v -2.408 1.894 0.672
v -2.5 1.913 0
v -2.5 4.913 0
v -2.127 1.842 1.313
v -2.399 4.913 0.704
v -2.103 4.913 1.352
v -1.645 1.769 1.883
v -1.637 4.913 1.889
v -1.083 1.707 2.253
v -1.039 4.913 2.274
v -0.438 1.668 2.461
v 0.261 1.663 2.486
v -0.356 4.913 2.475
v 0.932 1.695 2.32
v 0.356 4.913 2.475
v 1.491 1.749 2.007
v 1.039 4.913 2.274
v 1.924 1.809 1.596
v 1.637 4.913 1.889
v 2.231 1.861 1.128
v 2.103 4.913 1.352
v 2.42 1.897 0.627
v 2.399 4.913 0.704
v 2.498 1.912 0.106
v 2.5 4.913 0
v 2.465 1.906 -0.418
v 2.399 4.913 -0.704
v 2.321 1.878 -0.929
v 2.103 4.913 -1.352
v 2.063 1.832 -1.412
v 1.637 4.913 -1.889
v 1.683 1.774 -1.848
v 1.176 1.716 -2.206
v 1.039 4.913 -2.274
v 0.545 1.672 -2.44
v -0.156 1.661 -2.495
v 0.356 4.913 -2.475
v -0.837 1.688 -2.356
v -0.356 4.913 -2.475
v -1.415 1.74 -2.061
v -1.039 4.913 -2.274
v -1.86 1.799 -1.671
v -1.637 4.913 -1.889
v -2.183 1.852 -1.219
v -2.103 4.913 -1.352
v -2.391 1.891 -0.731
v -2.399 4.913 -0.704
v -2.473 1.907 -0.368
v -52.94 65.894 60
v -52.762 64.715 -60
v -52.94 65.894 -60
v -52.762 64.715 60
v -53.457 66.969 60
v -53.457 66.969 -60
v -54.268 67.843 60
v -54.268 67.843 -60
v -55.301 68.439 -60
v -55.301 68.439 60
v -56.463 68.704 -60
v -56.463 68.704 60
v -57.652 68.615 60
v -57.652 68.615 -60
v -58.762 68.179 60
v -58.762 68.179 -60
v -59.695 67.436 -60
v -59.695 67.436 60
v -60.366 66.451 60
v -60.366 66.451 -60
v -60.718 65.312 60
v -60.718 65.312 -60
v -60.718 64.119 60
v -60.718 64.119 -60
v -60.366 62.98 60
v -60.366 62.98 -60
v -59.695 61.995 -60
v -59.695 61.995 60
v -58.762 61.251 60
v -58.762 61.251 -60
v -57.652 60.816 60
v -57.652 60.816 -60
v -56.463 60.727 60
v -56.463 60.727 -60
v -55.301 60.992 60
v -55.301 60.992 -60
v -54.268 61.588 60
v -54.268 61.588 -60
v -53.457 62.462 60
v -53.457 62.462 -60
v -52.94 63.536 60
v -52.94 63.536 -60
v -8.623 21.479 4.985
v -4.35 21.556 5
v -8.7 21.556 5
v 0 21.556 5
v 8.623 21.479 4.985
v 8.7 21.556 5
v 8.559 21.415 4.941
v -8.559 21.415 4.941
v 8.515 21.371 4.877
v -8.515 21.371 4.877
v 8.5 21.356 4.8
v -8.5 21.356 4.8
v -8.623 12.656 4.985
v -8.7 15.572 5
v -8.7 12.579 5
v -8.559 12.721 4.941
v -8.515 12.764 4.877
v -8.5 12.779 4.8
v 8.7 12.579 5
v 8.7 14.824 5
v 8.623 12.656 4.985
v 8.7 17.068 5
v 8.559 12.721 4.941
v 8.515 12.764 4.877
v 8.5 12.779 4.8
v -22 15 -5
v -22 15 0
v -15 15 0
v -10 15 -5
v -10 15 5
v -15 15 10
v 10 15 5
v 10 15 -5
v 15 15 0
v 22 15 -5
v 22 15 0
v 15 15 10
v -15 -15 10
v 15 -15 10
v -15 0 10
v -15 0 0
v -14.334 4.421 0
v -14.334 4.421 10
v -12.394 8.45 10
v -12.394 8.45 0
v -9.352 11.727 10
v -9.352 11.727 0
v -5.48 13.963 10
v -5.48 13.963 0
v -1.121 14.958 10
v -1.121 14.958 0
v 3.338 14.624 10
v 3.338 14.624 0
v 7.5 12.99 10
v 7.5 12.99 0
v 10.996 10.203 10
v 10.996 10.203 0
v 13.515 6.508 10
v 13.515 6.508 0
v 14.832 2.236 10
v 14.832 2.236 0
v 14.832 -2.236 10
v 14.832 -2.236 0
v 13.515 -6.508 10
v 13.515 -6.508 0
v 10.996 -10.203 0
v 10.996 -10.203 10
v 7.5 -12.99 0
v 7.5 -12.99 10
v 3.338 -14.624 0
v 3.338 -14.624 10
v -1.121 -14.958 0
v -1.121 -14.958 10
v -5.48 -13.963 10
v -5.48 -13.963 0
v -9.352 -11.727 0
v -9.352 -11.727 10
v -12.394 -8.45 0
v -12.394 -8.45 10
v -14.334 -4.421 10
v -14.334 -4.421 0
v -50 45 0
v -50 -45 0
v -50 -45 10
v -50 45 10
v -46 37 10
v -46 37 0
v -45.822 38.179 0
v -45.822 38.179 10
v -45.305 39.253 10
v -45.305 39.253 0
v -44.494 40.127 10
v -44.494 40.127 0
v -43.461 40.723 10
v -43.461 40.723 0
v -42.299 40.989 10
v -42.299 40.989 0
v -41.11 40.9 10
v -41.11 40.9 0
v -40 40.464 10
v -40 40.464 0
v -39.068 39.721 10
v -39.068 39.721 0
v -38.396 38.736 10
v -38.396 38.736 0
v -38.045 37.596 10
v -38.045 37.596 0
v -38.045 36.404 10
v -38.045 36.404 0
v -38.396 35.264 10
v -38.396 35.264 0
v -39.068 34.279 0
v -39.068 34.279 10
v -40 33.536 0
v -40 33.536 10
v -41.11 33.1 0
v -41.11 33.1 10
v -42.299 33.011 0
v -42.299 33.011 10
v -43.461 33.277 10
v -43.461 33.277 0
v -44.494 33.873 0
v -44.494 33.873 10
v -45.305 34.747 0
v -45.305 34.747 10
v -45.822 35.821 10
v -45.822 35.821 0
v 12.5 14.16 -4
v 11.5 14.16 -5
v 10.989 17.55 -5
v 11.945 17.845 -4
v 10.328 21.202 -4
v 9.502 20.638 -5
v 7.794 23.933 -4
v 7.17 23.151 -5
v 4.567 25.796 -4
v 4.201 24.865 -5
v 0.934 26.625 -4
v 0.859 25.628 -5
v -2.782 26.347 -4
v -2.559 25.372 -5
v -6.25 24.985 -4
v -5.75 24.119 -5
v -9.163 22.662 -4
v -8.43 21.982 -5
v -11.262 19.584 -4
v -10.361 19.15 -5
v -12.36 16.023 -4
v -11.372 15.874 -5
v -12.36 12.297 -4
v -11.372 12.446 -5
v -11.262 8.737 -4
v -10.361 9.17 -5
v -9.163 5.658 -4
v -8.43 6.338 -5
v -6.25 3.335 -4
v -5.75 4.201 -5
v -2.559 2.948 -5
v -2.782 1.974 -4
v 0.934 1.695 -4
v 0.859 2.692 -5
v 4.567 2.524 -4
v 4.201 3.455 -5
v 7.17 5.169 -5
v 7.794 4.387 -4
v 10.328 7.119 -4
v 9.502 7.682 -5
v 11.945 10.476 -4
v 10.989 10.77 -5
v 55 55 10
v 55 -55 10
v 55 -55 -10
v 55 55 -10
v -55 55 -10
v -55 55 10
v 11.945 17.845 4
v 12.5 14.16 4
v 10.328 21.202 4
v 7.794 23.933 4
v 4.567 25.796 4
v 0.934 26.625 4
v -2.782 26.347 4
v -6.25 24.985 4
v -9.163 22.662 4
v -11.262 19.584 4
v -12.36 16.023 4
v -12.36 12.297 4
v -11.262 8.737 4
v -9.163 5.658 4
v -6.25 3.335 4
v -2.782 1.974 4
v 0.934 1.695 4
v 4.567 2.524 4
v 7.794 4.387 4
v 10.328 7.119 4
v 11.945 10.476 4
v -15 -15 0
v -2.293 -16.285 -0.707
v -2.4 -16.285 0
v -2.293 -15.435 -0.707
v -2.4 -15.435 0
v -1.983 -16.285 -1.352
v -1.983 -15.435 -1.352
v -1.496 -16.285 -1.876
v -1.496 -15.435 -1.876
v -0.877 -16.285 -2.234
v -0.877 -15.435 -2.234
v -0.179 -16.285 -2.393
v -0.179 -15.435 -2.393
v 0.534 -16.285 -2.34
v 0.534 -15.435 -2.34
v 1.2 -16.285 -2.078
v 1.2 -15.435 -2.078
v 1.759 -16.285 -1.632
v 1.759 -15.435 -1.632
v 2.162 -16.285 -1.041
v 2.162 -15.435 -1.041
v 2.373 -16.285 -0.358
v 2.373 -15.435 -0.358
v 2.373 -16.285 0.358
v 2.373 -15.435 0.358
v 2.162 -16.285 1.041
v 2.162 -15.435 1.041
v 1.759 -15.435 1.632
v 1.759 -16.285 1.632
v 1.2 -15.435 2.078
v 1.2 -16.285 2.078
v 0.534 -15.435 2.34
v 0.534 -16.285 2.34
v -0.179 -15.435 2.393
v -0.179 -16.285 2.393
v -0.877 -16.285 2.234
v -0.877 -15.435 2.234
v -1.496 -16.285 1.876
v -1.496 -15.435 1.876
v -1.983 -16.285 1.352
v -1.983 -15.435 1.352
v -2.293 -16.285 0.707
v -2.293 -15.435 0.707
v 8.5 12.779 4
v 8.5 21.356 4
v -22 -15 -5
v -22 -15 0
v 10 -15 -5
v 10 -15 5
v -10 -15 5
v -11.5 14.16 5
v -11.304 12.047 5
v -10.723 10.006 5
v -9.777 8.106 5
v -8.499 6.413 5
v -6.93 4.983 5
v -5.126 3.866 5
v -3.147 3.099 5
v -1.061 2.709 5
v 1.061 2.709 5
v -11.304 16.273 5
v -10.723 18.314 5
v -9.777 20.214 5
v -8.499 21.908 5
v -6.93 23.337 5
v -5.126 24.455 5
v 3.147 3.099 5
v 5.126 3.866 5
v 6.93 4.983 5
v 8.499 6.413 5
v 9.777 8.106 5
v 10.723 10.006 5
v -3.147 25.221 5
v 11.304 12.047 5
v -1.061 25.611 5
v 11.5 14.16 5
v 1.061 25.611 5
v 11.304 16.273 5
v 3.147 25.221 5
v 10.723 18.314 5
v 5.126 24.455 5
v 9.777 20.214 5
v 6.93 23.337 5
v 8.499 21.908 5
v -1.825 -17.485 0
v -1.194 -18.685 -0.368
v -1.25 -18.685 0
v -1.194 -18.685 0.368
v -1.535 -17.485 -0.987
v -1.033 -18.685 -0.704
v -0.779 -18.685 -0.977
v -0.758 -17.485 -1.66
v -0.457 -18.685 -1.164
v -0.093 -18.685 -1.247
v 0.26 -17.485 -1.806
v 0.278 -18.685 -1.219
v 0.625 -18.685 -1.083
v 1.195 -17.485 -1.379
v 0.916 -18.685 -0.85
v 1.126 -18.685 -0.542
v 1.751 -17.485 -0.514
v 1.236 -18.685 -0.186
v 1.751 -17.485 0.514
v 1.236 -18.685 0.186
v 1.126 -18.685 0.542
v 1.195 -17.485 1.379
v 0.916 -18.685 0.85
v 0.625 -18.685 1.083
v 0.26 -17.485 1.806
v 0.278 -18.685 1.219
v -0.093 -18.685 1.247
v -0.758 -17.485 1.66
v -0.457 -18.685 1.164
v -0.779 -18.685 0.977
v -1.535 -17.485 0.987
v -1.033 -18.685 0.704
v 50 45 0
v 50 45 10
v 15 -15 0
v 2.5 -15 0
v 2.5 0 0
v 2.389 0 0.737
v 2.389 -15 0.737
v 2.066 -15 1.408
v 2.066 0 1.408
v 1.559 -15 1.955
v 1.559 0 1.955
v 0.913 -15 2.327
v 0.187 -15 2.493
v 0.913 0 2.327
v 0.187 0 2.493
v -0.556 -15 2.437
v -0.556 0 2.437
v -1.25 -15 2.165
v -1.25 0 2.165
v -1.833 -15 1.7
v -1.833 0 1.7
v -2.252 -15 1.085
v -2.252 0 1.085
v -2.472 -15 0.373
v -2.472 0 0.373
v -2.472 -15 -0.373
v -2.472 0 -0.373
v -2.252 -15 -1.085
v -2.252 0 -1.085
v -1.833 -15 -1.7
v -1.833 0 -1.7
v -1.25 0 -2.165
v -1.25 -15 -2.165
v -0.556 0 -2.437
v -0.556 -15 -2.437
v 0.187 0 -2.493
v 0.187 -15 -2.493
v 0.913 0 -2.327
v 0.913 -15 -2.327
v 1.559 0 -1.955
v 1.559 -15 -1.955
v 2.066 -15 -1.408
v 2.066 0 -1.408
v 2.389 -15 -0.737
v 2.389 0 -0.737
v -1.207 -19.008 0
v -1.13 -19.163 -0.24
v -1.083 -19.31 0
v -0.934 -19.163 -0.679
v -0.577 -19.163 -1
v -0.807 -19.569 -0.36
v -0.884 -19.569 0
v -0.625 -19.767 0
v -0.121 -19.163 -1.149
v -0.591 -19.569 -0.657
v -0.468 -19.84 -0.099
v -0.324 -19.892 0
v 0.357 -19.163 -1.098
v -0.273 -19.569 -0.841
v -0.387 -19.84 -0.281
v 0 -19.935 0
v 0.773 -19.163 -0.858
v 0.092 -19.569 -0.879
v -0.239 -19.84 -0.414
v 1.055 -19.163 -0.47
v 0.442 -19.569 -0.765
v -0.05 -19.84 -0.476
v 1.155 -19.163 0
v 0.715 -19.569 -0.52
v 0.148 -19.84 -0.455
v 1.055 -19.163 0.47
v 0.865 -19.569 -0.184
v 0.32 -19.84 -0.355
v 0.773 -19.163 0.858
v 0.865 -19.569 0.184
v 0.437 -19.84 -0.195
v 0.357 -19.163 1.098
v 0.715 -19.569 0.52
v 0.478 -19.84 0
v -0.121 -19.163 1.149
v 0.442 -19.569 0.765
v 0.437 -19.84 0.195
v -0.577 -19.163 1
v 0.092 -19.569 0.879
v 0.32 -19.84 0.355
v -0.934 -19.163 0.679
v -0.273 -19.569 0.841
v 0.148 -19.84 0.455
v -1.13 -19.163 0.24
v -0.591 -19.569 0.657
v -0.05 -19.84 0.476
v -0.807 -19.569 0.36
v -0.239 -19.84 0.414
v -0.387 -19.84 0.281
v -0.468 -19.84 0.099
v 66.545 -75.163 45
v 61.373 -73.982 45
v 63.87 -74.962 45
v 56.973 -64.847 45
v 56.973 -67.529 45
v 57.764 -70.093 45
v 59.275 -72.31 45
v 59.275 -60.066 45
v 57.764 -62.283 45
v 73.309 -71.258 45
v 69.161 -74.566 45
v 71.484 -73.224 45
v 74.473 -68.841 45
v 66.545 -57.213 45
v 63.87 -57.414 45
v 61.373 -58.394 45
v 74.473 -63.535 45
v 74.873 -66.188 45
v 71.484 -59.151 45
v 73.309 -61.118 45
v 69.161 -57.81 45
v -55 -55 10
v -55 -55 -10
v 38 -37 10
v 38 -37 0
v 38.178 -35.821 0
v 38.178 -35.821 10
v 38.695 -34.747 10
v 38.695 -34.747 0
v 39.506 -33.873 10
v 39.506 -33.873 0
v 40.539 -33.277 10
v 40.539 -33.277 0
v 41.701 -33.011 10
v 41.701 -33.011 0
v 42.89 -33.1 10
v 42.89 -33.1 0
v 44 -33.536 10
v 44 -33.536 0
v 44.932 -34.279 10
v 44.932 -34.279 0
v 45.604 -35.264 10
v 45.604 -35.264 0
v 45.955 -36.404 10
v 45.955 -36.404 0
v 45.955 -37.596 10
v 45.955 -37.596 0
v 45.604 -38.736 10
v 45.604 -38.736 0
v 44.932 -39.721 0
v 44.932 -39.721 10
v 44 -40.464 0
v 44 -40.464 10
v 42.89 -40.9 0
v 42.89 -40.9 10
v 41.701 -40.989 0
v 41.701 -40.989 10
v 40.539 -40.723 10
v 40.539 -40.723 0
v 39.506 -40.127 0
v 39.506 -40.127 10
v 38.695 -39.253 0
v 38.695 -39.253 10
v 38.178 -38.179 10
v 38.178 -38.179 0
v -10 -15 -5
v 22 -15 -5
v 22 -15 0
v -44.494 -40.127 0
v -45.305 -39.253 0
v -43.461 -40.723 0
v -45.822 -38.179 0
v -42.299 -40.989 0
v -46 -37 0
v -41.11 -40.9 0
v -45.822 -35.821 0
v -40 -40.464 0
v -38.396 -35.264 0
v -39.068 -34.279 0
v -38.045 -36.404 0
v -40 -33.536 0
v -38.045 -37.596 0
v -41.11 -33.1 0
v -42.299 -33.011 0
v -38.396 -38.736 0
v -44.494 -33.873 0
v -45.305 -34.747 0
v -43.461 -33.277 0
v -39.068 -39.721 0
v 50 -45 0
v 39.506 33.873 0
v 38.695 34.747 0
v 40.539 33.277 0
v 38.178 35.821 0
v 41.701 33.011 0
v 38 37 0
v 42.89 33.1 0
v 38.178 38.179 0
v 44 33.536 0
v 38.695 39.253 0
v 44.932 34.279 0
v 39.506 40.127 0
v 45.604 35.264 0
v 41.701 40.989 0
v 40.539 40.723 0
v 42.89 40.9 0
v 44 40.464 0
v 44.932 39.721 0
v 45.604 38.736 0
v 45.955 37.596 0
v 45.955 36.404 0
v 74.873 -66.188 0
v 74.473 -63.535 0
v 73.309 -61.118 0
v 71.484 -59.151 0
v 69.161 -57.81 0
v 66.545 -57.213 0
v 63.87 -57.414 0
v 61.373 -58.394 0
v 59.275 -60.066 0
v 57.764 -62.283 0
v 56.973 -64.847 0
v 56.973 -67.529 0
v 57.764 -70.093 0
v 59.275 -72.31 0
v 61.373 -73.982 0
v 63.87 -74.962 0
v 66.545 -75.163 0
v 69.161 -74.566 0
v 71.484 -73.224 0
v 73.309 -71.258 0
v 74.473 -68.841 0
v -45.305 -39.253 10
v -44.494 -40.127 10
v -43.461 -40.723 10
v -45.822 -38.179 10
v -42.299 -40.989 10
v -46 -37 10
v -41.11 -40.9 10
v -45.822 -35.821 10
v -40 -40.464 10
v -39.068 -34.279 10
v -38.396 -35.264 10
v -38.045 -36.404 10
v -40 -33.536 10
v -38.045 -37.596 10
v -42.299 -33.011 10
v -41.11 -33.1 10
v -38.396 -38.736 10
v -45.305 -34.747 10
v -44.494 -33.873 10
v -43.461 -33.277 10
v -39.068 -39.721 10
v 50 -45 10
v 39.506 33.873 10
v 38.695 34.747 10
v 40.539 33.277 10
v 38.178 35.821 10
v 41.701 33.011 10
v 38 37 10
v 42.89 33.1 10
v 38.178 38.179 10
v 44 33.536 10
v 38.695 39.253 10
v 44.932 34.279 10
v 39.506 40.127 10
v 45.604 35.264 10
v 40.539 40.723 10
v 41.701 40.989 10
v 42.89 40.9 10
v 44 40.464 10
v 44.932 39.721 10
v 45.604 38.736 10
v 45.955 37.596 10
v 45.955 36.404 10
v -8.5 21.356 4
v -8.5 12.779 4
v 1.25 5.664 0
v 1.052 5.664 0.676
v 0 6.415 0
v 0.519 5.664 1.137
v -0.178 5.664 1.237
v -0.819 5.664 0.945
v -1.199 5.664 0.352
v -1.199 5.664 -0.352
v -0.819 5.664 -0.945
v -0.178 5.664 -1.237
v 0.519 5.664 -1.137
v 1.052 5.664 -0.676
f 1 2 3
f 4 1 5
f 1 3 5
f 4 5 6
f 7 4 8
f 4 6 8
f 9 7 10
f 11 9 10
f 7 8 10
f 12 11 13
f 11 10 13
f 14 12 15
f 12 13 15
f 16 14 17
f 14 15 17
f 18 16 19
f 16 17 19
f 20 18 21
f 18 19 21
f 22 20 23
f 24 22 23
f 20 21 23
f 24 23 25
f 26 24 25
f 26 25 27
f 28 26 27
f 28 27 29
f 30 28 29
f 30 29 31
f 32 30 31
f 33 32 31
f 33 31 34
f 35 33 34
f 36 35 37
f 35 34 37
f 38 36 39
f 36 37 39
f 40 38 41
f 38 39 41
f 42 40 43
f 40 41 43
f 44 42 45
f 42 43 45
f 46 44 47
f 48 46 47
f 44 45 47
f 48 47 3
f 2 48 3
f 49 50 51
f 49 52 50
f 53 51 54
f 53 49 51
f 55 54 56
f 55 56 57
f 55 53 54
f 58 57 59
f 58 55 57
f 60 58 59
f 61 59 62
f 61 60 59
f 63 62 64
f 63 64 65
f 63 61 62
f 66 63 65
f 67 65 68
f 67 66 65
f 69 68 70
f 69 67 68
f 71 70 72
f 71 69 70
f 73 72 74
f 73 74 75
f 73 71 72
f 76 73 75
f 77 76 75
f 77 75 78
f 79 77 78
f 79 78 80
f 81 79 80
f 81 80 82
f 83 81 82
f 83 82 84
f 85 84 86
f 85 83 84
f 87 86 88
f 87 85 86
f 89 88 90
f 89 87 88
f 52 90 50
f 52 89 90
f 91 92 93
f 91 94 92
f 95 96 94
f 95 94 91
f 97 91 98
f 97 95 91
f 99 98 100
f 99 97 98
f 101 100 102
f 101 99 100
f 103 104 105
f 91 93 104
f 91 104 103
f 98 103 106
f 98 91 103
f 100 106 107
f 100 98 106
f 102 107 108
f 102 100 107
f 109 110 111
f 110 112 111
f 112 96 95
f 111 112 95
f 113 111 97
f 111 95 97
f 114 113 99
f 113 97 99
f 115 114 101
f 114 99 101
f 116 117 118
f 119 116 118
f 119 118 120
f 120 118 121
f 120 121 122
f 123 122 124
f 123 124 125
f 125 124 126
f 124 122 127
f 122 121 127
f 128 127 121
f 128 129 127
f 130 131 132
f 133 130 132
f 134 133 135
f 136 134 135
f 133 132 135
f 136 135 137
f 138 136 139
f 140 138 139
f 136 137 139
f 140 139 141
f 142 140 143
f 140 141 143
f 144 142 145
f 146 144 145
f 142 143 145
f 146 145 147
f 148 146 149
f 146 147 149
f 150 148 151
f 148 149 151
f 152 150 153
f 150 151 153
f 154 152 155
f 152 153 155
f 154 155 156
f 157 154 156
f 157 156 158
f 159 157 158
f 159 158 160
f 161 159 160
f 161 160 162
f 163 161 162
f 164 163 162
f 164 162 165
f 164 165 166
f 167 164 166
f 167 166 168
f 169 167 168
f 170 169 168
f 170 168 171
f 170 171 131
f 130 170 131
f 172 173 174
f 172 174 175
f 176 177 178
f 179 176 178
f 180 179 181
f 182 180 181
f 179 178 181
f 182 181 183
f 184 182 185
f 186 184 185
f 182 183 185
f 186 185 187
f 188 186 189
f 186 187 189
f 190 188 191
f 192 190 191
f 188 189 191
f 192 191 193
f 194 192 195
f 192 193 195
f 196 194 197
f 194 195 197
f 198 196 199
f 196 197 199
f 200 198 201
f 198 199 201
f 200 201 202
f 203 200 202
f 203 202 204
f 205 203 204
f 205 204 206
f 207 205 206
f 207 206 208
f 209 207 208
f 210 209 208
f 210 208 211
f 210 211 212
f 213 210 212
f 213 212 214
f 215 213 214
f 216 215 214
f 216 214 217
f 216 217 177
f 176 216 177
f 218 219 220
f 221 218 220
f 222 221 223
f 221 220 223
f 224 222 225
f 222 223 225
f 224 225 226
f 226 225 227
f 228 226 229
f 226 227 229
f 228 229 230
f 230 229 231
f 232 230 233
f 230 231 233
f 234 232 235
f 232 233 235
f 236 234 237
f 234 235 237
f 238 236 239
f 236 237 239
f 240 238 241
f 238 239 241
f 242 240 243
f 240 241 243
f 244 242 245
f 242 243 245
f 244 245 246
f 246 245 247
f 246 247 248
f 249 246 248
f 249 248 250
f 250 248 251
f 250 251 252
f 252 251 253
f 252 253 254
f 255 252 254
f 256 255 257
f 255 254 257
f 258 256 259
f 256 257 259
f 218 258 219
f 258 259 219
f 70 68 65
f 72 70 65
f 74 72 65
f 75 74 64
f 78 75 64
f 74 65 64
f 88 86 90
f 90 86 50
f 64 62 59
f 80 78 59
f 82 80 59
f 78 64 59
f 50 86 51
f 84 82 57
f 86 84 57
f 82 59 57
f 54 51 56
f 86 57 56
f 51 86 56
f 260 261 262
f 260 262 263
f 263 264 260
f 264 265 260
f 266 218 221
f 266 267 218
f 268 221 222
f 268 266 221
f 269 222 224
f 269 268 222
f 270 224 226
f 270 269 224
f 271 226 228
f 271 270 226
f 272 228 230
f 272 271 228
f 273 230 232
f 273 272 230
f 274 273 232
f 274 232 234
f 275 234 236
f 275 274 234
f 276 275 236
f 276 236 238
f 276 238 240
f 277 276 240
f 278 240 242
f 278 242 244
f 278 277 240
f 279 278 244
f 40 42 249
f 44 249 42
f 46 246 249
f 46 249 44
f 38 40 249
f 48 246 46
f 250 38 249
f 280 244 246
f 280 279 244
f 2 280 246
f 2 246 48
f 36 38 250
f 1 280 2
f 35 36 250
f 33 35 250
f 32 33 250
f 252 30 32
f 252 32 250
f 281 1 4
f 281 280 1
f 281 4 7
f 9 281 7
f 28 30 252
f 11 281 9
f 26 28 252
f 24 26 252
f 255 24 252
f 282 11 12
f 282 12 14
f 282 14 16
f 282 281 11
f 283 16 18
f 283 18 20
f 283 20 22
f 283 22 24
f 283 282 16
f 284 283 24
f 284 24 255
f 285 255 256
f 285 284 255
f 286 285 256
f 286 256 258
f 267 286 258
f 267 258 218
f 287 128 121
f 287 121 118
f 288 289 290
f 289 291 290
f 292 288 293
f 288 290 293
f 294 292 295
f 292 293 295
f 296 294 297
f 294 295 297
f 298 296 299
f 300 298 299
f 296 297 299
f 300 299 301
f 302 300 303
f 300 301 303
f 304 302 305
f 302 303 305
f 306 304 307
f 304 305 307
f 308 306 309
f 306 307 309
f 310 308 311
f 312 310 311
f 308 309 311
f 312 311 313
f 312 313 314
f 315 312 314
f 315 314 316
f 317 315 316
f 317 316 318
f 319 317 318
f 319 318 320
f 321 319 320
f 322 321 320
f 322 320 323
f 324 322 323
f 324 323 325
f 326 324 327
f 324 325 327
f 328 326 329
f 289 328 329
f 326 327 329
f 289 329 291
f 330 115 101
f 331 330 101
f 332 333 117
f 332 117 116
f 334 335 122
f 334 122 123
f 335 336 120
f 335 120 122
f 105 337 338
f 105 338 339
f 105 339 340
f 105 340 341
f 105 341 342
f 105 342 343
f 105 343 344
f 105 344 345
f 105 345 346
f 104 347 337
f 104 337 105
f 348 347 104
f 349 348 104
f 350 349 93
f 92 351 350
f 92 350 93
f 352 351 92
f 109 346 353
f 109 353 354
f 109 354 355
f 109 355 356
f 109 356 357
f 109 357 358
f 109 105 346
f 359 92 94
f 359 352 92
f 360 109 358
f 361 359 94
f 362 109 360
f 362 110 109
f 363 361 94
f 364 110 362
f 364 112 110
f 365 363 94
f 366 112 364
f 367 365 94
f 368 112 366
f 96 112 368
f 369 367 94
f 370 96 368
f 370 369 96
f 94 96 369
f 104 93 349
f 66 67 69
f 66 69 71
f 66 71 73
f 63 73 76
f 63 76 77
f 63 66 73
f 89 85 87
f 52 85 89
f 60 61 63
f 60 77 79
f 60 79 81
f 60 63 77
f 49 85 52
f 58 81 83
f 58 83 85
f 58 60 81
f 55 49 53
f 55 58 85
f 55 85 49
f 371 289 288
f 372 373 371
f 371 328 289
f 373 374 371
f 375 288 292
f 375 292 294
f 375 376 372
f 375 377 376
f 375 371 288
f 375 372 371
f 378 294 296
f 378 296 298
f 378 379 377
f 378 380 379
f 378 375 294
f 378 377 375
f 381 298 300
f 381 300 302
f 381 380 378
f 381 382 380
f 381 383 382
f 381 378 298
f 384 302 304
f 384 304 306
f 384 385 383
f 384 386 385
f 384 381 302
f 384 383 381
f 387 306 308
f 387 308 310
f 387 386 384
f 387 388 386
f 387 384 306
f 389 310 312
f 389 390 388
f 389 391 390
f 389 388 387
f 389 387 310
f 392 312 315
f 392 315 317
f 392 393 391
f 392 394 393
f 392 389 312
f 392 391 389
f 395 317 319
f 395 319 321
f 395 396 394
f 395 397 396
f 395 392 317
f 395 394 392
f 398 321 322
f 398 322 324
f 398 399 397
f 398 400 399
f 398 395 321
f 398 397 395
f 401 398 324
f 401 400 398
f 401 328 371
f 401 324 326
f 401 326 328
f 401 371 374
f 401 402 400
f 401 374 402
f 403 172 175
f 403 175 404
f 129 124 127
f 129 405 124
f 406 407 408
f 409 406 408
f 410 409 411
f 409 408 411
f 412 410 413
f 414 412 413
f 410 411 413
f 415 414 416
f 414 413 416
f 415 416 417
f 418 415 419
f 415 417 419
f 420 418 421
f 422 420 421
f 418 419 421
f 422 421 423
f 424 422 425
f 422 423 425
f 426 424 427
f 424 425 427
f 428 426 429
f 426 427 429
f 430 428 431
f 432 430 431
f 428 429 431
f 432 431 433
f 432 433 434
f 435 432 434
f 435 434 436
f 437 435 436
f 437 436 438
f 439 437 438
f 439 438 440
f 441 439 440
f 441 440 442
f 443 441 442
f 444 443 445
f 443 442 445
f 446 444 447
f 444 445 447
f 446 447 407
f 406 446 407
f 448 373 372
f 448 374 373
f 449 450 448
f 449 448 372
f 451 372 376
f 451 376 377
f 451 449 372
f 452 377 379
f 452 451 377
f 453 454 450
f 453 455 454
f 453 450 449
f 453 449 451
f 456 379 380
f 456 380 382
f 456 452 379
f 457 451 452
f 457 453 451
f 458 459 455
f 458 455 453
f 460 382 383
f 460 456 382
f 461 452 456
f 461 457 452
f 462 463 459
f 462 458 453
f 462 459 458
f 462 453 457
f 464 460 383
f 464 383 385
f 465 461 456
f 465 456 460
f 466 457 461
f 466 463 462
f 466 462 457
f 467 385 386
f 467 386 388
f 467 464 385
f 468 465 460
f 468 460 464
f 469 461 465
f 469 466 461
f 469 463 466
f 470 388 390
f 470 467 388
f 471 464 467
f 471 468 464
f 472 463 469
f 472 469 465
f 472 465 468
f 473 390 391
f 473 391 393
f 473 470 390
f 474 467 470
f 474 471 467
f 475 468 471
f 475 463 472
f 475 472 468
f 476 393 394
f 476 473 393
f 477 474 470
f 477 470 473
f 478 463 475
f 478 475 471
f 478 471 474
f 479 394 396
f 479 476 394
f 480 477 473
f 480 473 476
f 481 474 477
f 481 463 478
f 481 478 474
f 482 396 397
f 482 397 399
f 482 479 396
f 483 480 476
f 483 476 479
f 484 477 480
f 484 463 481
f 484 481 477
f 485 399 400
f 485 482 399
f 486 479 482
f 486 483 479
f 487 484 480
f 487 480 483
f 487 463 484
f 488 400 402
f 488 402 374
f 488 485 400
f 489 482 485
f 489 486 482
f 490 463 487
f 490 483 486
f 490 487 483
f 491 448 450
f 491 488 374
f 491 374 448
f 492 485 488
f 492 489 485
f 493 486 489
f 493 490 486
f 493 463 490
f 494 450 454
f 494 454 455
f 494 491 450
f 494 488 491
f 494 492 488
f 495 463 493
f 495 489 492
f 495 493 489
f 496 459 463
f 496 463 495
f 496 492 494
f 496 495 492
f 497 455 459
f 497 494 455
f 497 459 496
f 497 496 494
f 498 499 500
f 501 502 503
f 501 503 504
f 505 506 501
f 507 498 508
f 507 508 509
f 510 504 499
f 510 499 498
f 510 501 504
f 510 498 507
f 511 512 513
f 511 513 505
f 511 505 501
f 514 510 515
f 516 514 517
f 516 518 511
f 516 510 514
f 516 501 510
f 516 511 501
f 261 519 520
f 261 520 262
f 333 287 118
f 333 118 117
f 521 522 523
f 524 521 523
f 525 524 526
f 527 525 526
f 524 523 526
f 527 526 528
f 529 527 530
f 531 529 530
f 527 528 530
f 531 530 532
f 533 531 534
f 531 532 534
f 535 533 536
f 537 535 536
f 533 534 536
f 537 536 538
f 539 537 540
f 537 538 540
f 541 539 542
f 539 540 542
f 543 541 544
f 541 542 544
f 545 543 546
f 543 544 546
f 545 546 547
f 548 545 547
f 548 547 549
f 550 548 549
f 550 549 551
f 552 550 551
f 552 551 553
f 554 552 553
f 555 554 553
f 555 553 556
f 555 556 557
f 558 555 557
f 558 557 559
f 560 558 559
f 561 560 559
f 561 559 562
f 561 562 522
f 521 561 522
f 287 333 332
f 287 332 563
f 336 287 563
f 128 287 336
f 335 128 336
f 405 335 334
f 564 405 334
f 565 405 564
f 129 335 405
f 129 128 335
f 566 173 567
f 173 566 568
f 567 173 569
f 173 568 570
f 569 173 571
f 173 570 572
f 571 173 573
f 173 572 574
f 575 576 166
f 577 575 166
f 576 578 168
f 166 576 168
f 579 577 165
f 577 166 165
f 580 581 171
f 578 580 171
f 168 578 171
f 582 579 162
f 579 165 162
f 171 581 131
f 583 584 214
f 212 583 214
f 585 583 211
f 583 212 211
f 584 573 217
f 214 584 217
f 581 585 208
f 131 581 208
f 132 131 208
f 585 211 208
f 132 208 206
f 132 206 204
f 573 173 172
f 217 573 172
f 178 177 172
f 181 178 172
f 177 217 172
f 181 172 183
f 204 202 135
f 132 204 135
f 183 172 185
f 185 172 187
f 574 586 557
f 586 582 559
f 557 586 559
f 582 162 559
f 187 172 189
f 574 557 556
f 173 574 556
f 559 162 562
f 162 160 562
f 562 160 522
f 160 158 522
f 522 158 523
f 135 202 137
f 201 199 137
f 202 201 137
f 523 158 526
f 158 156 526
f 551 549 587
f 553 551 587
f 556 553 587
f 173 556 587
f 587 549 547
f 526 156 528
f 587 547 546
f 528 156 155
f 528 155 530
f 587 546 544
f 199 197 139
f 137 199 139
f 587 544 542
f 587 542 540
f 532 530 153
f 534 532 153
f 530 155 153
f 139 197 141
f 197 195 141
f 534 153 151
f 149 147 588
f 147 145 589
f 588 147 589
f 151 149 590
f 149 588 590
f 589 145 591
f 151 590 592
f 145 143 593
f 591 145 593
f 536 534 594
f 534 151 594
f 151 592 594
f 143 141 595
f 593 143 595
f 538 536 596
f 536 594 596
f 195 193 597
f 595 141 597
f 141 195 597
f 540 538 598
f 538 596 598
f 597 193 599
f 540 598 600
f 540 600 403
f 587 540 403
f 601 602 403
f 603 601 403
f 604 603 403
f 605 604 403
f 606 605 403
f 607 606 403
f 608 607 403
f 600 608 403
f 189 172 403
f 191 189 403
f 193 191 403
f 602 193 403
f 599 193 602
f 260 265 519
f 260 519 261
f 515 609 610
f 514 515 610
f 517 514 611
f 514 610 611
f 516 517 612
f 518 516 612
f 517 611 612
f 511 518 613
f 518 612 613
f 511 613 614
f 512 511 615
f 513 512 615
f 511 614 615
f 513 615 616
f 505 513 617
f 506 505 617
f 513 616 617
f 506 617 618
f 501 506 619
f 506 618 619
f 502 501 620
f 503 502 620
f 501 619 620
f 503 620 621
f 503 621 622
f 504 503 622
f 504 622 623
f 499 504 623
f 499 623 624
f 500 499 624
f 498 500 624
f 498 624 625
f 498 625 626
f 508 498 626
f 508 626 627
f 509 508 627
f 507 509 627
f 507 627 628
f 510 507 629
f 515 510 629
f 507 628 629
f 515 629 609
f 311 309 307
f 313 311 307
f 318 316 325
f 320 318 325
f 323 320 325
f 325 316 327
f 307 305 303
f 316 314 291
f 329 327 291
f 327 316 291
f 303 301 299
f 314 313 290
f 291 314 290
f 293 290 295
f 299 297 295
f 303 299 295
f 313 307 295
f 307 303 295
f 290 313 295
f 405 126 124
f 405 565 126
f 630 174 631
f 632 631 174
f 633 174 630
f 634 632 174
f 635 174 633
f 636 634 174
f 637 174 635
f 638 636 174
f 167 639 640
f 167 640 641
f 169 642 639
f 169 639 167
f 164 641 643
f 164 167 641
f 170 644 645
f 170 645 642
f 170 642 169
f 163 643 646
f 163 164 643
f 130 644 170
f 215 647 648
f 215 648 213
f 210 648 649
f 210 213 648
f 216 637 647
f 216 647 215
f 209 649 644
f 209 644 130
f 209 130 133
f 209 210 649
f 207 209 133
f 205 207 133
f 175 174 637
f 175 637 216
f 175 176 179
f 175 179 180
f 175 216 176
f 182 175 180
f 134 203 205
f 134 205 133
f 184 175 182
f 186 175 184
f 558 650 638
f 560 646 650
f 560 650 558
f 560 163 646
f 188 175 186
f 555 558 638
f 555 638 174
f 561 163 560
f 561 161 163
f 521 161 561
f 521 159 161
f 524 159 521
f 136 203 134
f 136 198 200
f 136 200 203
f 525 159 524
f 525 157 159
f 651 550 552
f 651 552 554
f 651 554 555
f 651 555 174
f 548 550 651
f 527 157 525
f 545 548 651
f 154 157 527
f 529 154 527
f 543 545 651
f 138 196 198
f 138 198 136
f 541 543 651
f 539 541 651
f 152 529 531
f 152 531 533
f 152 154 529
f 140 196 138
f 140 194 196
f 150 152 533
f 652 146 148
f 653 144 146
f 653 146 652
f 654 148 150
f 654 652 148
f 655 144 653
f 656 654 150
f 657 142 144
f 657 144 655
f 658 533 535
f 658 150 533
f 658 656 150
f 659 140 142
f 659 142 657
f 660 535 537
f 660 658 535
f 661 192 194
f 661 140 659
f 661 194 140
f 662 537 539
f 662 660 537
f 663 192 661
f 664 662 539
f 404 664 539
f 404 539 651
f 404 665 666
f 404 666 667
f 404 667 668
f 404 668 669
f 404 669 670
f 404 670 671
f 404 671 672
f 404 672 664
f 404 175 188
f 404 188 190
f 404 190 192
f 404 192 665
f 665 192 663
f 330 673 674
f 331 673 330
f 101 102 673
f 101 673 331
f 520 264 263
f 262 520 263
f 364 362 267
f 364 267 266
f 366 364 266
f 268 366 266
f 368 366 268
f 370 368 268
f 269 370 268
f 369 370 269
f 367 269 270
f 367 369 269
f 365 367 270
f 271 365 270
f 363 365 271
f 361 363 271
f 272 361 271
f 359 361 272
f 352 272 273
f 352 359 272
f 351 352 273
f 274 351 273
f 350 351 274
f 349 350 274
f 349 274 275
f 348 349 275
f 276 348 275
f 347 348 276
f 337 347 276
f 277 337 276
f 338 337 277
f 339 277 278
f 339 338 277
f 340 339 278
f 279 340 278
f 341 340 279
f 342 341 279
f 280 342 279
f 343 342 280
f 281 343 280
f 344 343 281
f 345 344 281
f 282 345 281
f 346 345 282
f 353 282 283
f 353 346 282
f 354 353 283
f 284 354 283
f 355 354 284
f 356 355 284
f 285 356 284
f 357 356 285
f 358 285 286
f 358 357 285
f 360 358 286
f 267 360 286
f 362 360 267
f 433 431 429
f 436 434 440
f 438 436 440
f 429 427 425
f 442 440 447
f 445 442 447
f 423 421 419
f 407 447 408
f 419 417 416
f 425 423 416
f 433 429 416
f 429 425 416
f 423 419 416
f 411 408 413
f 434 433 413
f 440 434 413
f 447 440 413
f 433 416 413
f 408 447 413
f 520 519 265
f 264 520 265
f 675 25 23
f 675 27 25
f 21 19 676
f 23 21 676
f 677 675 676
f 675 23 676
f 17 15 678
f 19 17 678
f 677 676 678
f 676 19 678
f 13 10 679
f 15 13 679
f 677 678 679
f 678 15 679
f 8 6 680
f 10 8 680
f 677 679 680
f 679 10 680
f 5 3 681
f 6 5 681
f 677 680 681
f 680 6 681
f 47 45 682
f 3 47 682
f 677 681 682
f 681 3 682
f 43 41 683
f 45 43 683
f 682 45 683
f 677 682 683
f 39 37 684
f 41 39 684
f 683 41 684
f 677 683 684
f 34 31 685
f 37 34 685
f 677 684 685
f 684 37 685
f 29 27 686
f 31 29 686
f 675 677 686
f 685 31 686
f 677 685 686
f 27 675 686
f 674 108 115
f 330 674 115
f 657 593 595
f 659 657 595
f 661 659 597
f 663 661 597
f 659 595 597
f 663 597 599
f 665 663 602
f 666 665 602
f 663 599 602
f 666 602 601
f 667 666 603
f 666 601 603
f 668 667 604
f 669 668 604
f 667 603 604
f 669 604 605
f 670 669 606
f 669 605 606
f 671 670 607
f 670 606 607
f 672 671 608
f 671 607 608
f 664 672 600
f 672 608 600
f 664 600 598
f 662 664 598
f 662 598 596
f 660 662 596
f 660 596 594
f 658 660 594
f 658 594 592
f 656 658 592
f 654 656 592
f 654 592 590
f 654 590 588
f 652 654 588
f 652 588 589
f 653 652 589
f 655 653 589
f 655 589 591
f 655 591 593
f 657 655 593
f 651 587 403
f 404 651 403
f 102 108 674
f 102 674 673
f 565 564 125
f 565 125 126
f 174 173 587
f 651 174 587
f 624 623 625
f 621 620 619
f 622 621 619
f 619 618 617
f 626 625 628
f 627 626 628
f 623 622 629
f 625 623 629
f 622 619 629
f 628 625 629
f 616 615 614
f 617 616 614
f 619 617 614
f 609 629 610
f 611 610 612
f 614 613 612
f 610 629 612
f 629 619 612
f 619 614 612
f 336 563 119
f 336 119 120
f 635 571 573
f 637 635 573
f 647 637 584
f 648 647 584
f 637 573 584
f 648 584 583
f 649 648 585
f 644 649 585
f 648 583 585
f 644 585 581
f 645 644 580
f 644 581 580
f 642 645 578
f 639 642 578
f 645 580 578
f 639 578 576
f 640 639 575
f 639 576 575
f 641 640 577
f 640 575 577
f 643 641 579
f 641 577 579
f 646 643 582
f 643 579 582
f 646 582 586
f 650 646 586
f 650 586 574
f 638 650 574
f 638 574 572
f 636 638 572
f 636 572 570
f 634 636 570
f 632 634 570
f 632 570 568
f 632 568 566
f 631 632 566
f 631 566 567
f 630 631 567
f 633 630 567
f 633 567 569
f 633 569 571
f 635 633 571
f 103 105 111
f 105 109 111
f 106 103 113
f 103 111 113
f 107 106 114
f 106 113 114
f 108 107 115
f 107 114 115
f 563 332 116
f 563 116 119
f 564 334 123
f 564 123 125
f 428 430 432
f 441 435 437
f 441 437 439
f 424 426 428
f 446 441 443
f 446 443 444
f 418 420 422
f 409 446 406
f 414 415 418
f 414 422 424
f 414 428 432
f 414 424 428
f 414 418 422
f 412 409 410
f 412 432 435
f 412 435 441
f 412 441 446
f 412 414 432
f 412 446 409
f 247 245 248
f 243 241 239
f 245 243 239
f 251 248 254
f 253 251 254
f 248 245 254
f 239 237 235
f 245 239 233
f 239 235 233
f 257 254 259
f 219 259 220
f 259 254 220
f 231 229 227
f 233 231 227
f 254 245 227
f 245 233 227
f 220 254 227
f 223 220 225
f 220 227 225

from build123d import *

# Parameters (mm, degrees)
F0_W           = 100
F0_H           = 90
F1_DEPTH       = 10
F3_D           = 8
F4_R           = 9
F5_DEPTH       = 45
F6_R           = 4
F7_DEPTH       = 60
F7_DEPTH_BACK  = 60
F8_W           = 110
F8_H           = 110
F9_DEPTH       = 10
F9_DEPTH_BACK  = 10
F11_D          = 30
F12_R          = 12.5
F13_DEPTH      = 5
F13_DEPTH_BACK = 5
F14_R          = 2.5
F15_DEPTH      = 15
F16_W          = 2.4
F16_H          = 0.85
F18_W          = 17
F18_H          = 8.5765231597
F19_DEPTH      = 1
F20_SIZE       = 1
F21_R          = 0.2
F23_D          = 5
F23_DEPTH      = 3
F23_START      = 1.9126872
F23_TIP        = 1.5021515476
F25_DEPTH      = 15
F25_DEPTH_BACK = 15


with BuildPart() as f1:
    # F0 (on Top) → F1 (new body)
    with BuildSketch(Plane.XY):
        Rectangle(F0_W, F0_H)
    extrude(amount=F1_DEPTH)

    # F3 (through all)
    with Locations(Plane.XY.offset(10)):
        with Locations((-42, 37), (42, 37), (42, -37), (-42, -37)):
            Hole(F3_D / 2)

    # F11 (through all)
    with Locations(Plane.XY.offset(10)):
        with Locations((0, 0)):
            Hole(F11_D / 2)


with BuildPart() as f5:
    # F4 (on Top) → F5 (new body)
    with BuildSketch(Plane.XY):
        with Locations((65.8727884293, -66.1879479885)):
            Circle(F4_R)
    extrude(amount=F5_DEPTH)


with BuildPart() as f7:
    # F6 (on Top) → F7 (new body, two sides)
    with BuildSketch(Plane.XY) as f7_sk:
        with Locations((-56.7623786628, 64.7153481841)):
            Circle(F6_R)
    extrude(amount=F7_DEPTH)
    extrude(f7_sk.sketch, amount=-F7_DEPTH_BACK)


with BuildPart() as f9:
    # F8 (on Top) → F9 (new body, two sides)
    with BuildSketch(Plane.XY) as f9_sk:
        Rectangle(F8_W, F8_H)
    extrude(amount=F9_DEPTH)
    extrude(f9_sk.sketch, amount=-F9_DEPTH_BACK)


with BuildPart() as f13:
    # F12 (on Top) → F13 (new body, two sides)
    with BuildSketch(Plane.XY) as f13_sk:
        with Locations((0, 14.160135775)):
            Circle(F12_R)
    extrude(amount=F13_DEPTH)
    extrude(f13_sk.sketch, amount=-F13_DEPTH_BACK)

    # F18 (on face) → F19 (cut)
    with BuildSketch(Plane.XY.offset(5)):
        with Locations((0, 17.0677408393)):
            Rectangle(F18_W, F18_H)
    extrude(amount=-F19_DEPTH, mode=Mode.SUBTRACT)

    # F20
    f20_edges = [f13.edges().sort_by_distance(p)[0] for p in [
        (-12.5, 14.160136, -5),
        (-12.5, 14.160136, 5),
    ]]
    chamfer(f20_edges, length=F20_SIZE)

    # F21
    f21_edges = [f13.edges().sort_by_distance(p)[0] for p in [
        (0, 21.356002, 5),
        (8.5, 17.067741, 5),
        (0, 12.779479, 5),
        (-8.5, 17.067741, 5),
    ]]
    fillet(f21_edges, radius=F21_R)

    # F23
    # its depths count from where the whole tool has entered the part; down to there all is cleared
    with Locations(Plane.XZ.offset(-F23_START)):
        with Locations((0, 0)):
            Hole(F23_D / 2, depth=F23_DEPTH)
            with Locations((0, 0, -(F23_DEPTH + F23_TIP / 2))):  # 118° drill point
                Cone(0, F23_D / 2, F23_TIP, mode=Mode.SUBTRACT)


with BuildPart() as f15:
    # F14 (on Front) → F15 (new body)
    with BuildSketch(Plane.XZ):
        Circle(F14_R)
    extrude(amount=F15_DEPTH)


with BuildPart() as f17:
    # F16 (on Top) → F17 (revolve)
    with BuildSketch(Plane.XY):
        with Locations((-1.2, -15.8598149988)):
            Rectangle(F16_W, F16_H)
        Polygon((0, -16.2848149988), (-2.4, -16.2848149988), (-1.25, -18.6848149988), (0, -18.6848149988), align=None)
        with BuildLine():
            Line((0, -18.6848149988), (-1.25, -18.6848149988))
            ThreePointArc((-1.25, -18.6848149988), (-0.8838834765, -19.5686984753), (0, -19.9348149988))
            Line((0, -19.9348149988), (0, -18.6848149988))
        make_face()
    revolve(axis=Axis((0, -17.6848149988, 0), (0, -1, 0)))


with BuildPart() as f25:
    # F24 (on Front) → F25 (new body, two sides)
    with BuildSketch(Plane.XZ) as f25_sk:
        Polygon((15, 10), (-15, 10), (-15, 0), (-22, 0), (-22, -5), (-15, -5), (-10, -5), (-10, 5), (10, 5), (10, -5), (15, -5), (22, -5), (22, 0), (15, 0), align=None)
    extrude(amount=F25_DEPTH)
    extrude(f25_sk.sketch, amount=-F25_DEPTH_BACK)


solid = Compound([f1.part, f5.part, f7.part, f9.part, f13.part, f15.part, f17.part, f25.part])
